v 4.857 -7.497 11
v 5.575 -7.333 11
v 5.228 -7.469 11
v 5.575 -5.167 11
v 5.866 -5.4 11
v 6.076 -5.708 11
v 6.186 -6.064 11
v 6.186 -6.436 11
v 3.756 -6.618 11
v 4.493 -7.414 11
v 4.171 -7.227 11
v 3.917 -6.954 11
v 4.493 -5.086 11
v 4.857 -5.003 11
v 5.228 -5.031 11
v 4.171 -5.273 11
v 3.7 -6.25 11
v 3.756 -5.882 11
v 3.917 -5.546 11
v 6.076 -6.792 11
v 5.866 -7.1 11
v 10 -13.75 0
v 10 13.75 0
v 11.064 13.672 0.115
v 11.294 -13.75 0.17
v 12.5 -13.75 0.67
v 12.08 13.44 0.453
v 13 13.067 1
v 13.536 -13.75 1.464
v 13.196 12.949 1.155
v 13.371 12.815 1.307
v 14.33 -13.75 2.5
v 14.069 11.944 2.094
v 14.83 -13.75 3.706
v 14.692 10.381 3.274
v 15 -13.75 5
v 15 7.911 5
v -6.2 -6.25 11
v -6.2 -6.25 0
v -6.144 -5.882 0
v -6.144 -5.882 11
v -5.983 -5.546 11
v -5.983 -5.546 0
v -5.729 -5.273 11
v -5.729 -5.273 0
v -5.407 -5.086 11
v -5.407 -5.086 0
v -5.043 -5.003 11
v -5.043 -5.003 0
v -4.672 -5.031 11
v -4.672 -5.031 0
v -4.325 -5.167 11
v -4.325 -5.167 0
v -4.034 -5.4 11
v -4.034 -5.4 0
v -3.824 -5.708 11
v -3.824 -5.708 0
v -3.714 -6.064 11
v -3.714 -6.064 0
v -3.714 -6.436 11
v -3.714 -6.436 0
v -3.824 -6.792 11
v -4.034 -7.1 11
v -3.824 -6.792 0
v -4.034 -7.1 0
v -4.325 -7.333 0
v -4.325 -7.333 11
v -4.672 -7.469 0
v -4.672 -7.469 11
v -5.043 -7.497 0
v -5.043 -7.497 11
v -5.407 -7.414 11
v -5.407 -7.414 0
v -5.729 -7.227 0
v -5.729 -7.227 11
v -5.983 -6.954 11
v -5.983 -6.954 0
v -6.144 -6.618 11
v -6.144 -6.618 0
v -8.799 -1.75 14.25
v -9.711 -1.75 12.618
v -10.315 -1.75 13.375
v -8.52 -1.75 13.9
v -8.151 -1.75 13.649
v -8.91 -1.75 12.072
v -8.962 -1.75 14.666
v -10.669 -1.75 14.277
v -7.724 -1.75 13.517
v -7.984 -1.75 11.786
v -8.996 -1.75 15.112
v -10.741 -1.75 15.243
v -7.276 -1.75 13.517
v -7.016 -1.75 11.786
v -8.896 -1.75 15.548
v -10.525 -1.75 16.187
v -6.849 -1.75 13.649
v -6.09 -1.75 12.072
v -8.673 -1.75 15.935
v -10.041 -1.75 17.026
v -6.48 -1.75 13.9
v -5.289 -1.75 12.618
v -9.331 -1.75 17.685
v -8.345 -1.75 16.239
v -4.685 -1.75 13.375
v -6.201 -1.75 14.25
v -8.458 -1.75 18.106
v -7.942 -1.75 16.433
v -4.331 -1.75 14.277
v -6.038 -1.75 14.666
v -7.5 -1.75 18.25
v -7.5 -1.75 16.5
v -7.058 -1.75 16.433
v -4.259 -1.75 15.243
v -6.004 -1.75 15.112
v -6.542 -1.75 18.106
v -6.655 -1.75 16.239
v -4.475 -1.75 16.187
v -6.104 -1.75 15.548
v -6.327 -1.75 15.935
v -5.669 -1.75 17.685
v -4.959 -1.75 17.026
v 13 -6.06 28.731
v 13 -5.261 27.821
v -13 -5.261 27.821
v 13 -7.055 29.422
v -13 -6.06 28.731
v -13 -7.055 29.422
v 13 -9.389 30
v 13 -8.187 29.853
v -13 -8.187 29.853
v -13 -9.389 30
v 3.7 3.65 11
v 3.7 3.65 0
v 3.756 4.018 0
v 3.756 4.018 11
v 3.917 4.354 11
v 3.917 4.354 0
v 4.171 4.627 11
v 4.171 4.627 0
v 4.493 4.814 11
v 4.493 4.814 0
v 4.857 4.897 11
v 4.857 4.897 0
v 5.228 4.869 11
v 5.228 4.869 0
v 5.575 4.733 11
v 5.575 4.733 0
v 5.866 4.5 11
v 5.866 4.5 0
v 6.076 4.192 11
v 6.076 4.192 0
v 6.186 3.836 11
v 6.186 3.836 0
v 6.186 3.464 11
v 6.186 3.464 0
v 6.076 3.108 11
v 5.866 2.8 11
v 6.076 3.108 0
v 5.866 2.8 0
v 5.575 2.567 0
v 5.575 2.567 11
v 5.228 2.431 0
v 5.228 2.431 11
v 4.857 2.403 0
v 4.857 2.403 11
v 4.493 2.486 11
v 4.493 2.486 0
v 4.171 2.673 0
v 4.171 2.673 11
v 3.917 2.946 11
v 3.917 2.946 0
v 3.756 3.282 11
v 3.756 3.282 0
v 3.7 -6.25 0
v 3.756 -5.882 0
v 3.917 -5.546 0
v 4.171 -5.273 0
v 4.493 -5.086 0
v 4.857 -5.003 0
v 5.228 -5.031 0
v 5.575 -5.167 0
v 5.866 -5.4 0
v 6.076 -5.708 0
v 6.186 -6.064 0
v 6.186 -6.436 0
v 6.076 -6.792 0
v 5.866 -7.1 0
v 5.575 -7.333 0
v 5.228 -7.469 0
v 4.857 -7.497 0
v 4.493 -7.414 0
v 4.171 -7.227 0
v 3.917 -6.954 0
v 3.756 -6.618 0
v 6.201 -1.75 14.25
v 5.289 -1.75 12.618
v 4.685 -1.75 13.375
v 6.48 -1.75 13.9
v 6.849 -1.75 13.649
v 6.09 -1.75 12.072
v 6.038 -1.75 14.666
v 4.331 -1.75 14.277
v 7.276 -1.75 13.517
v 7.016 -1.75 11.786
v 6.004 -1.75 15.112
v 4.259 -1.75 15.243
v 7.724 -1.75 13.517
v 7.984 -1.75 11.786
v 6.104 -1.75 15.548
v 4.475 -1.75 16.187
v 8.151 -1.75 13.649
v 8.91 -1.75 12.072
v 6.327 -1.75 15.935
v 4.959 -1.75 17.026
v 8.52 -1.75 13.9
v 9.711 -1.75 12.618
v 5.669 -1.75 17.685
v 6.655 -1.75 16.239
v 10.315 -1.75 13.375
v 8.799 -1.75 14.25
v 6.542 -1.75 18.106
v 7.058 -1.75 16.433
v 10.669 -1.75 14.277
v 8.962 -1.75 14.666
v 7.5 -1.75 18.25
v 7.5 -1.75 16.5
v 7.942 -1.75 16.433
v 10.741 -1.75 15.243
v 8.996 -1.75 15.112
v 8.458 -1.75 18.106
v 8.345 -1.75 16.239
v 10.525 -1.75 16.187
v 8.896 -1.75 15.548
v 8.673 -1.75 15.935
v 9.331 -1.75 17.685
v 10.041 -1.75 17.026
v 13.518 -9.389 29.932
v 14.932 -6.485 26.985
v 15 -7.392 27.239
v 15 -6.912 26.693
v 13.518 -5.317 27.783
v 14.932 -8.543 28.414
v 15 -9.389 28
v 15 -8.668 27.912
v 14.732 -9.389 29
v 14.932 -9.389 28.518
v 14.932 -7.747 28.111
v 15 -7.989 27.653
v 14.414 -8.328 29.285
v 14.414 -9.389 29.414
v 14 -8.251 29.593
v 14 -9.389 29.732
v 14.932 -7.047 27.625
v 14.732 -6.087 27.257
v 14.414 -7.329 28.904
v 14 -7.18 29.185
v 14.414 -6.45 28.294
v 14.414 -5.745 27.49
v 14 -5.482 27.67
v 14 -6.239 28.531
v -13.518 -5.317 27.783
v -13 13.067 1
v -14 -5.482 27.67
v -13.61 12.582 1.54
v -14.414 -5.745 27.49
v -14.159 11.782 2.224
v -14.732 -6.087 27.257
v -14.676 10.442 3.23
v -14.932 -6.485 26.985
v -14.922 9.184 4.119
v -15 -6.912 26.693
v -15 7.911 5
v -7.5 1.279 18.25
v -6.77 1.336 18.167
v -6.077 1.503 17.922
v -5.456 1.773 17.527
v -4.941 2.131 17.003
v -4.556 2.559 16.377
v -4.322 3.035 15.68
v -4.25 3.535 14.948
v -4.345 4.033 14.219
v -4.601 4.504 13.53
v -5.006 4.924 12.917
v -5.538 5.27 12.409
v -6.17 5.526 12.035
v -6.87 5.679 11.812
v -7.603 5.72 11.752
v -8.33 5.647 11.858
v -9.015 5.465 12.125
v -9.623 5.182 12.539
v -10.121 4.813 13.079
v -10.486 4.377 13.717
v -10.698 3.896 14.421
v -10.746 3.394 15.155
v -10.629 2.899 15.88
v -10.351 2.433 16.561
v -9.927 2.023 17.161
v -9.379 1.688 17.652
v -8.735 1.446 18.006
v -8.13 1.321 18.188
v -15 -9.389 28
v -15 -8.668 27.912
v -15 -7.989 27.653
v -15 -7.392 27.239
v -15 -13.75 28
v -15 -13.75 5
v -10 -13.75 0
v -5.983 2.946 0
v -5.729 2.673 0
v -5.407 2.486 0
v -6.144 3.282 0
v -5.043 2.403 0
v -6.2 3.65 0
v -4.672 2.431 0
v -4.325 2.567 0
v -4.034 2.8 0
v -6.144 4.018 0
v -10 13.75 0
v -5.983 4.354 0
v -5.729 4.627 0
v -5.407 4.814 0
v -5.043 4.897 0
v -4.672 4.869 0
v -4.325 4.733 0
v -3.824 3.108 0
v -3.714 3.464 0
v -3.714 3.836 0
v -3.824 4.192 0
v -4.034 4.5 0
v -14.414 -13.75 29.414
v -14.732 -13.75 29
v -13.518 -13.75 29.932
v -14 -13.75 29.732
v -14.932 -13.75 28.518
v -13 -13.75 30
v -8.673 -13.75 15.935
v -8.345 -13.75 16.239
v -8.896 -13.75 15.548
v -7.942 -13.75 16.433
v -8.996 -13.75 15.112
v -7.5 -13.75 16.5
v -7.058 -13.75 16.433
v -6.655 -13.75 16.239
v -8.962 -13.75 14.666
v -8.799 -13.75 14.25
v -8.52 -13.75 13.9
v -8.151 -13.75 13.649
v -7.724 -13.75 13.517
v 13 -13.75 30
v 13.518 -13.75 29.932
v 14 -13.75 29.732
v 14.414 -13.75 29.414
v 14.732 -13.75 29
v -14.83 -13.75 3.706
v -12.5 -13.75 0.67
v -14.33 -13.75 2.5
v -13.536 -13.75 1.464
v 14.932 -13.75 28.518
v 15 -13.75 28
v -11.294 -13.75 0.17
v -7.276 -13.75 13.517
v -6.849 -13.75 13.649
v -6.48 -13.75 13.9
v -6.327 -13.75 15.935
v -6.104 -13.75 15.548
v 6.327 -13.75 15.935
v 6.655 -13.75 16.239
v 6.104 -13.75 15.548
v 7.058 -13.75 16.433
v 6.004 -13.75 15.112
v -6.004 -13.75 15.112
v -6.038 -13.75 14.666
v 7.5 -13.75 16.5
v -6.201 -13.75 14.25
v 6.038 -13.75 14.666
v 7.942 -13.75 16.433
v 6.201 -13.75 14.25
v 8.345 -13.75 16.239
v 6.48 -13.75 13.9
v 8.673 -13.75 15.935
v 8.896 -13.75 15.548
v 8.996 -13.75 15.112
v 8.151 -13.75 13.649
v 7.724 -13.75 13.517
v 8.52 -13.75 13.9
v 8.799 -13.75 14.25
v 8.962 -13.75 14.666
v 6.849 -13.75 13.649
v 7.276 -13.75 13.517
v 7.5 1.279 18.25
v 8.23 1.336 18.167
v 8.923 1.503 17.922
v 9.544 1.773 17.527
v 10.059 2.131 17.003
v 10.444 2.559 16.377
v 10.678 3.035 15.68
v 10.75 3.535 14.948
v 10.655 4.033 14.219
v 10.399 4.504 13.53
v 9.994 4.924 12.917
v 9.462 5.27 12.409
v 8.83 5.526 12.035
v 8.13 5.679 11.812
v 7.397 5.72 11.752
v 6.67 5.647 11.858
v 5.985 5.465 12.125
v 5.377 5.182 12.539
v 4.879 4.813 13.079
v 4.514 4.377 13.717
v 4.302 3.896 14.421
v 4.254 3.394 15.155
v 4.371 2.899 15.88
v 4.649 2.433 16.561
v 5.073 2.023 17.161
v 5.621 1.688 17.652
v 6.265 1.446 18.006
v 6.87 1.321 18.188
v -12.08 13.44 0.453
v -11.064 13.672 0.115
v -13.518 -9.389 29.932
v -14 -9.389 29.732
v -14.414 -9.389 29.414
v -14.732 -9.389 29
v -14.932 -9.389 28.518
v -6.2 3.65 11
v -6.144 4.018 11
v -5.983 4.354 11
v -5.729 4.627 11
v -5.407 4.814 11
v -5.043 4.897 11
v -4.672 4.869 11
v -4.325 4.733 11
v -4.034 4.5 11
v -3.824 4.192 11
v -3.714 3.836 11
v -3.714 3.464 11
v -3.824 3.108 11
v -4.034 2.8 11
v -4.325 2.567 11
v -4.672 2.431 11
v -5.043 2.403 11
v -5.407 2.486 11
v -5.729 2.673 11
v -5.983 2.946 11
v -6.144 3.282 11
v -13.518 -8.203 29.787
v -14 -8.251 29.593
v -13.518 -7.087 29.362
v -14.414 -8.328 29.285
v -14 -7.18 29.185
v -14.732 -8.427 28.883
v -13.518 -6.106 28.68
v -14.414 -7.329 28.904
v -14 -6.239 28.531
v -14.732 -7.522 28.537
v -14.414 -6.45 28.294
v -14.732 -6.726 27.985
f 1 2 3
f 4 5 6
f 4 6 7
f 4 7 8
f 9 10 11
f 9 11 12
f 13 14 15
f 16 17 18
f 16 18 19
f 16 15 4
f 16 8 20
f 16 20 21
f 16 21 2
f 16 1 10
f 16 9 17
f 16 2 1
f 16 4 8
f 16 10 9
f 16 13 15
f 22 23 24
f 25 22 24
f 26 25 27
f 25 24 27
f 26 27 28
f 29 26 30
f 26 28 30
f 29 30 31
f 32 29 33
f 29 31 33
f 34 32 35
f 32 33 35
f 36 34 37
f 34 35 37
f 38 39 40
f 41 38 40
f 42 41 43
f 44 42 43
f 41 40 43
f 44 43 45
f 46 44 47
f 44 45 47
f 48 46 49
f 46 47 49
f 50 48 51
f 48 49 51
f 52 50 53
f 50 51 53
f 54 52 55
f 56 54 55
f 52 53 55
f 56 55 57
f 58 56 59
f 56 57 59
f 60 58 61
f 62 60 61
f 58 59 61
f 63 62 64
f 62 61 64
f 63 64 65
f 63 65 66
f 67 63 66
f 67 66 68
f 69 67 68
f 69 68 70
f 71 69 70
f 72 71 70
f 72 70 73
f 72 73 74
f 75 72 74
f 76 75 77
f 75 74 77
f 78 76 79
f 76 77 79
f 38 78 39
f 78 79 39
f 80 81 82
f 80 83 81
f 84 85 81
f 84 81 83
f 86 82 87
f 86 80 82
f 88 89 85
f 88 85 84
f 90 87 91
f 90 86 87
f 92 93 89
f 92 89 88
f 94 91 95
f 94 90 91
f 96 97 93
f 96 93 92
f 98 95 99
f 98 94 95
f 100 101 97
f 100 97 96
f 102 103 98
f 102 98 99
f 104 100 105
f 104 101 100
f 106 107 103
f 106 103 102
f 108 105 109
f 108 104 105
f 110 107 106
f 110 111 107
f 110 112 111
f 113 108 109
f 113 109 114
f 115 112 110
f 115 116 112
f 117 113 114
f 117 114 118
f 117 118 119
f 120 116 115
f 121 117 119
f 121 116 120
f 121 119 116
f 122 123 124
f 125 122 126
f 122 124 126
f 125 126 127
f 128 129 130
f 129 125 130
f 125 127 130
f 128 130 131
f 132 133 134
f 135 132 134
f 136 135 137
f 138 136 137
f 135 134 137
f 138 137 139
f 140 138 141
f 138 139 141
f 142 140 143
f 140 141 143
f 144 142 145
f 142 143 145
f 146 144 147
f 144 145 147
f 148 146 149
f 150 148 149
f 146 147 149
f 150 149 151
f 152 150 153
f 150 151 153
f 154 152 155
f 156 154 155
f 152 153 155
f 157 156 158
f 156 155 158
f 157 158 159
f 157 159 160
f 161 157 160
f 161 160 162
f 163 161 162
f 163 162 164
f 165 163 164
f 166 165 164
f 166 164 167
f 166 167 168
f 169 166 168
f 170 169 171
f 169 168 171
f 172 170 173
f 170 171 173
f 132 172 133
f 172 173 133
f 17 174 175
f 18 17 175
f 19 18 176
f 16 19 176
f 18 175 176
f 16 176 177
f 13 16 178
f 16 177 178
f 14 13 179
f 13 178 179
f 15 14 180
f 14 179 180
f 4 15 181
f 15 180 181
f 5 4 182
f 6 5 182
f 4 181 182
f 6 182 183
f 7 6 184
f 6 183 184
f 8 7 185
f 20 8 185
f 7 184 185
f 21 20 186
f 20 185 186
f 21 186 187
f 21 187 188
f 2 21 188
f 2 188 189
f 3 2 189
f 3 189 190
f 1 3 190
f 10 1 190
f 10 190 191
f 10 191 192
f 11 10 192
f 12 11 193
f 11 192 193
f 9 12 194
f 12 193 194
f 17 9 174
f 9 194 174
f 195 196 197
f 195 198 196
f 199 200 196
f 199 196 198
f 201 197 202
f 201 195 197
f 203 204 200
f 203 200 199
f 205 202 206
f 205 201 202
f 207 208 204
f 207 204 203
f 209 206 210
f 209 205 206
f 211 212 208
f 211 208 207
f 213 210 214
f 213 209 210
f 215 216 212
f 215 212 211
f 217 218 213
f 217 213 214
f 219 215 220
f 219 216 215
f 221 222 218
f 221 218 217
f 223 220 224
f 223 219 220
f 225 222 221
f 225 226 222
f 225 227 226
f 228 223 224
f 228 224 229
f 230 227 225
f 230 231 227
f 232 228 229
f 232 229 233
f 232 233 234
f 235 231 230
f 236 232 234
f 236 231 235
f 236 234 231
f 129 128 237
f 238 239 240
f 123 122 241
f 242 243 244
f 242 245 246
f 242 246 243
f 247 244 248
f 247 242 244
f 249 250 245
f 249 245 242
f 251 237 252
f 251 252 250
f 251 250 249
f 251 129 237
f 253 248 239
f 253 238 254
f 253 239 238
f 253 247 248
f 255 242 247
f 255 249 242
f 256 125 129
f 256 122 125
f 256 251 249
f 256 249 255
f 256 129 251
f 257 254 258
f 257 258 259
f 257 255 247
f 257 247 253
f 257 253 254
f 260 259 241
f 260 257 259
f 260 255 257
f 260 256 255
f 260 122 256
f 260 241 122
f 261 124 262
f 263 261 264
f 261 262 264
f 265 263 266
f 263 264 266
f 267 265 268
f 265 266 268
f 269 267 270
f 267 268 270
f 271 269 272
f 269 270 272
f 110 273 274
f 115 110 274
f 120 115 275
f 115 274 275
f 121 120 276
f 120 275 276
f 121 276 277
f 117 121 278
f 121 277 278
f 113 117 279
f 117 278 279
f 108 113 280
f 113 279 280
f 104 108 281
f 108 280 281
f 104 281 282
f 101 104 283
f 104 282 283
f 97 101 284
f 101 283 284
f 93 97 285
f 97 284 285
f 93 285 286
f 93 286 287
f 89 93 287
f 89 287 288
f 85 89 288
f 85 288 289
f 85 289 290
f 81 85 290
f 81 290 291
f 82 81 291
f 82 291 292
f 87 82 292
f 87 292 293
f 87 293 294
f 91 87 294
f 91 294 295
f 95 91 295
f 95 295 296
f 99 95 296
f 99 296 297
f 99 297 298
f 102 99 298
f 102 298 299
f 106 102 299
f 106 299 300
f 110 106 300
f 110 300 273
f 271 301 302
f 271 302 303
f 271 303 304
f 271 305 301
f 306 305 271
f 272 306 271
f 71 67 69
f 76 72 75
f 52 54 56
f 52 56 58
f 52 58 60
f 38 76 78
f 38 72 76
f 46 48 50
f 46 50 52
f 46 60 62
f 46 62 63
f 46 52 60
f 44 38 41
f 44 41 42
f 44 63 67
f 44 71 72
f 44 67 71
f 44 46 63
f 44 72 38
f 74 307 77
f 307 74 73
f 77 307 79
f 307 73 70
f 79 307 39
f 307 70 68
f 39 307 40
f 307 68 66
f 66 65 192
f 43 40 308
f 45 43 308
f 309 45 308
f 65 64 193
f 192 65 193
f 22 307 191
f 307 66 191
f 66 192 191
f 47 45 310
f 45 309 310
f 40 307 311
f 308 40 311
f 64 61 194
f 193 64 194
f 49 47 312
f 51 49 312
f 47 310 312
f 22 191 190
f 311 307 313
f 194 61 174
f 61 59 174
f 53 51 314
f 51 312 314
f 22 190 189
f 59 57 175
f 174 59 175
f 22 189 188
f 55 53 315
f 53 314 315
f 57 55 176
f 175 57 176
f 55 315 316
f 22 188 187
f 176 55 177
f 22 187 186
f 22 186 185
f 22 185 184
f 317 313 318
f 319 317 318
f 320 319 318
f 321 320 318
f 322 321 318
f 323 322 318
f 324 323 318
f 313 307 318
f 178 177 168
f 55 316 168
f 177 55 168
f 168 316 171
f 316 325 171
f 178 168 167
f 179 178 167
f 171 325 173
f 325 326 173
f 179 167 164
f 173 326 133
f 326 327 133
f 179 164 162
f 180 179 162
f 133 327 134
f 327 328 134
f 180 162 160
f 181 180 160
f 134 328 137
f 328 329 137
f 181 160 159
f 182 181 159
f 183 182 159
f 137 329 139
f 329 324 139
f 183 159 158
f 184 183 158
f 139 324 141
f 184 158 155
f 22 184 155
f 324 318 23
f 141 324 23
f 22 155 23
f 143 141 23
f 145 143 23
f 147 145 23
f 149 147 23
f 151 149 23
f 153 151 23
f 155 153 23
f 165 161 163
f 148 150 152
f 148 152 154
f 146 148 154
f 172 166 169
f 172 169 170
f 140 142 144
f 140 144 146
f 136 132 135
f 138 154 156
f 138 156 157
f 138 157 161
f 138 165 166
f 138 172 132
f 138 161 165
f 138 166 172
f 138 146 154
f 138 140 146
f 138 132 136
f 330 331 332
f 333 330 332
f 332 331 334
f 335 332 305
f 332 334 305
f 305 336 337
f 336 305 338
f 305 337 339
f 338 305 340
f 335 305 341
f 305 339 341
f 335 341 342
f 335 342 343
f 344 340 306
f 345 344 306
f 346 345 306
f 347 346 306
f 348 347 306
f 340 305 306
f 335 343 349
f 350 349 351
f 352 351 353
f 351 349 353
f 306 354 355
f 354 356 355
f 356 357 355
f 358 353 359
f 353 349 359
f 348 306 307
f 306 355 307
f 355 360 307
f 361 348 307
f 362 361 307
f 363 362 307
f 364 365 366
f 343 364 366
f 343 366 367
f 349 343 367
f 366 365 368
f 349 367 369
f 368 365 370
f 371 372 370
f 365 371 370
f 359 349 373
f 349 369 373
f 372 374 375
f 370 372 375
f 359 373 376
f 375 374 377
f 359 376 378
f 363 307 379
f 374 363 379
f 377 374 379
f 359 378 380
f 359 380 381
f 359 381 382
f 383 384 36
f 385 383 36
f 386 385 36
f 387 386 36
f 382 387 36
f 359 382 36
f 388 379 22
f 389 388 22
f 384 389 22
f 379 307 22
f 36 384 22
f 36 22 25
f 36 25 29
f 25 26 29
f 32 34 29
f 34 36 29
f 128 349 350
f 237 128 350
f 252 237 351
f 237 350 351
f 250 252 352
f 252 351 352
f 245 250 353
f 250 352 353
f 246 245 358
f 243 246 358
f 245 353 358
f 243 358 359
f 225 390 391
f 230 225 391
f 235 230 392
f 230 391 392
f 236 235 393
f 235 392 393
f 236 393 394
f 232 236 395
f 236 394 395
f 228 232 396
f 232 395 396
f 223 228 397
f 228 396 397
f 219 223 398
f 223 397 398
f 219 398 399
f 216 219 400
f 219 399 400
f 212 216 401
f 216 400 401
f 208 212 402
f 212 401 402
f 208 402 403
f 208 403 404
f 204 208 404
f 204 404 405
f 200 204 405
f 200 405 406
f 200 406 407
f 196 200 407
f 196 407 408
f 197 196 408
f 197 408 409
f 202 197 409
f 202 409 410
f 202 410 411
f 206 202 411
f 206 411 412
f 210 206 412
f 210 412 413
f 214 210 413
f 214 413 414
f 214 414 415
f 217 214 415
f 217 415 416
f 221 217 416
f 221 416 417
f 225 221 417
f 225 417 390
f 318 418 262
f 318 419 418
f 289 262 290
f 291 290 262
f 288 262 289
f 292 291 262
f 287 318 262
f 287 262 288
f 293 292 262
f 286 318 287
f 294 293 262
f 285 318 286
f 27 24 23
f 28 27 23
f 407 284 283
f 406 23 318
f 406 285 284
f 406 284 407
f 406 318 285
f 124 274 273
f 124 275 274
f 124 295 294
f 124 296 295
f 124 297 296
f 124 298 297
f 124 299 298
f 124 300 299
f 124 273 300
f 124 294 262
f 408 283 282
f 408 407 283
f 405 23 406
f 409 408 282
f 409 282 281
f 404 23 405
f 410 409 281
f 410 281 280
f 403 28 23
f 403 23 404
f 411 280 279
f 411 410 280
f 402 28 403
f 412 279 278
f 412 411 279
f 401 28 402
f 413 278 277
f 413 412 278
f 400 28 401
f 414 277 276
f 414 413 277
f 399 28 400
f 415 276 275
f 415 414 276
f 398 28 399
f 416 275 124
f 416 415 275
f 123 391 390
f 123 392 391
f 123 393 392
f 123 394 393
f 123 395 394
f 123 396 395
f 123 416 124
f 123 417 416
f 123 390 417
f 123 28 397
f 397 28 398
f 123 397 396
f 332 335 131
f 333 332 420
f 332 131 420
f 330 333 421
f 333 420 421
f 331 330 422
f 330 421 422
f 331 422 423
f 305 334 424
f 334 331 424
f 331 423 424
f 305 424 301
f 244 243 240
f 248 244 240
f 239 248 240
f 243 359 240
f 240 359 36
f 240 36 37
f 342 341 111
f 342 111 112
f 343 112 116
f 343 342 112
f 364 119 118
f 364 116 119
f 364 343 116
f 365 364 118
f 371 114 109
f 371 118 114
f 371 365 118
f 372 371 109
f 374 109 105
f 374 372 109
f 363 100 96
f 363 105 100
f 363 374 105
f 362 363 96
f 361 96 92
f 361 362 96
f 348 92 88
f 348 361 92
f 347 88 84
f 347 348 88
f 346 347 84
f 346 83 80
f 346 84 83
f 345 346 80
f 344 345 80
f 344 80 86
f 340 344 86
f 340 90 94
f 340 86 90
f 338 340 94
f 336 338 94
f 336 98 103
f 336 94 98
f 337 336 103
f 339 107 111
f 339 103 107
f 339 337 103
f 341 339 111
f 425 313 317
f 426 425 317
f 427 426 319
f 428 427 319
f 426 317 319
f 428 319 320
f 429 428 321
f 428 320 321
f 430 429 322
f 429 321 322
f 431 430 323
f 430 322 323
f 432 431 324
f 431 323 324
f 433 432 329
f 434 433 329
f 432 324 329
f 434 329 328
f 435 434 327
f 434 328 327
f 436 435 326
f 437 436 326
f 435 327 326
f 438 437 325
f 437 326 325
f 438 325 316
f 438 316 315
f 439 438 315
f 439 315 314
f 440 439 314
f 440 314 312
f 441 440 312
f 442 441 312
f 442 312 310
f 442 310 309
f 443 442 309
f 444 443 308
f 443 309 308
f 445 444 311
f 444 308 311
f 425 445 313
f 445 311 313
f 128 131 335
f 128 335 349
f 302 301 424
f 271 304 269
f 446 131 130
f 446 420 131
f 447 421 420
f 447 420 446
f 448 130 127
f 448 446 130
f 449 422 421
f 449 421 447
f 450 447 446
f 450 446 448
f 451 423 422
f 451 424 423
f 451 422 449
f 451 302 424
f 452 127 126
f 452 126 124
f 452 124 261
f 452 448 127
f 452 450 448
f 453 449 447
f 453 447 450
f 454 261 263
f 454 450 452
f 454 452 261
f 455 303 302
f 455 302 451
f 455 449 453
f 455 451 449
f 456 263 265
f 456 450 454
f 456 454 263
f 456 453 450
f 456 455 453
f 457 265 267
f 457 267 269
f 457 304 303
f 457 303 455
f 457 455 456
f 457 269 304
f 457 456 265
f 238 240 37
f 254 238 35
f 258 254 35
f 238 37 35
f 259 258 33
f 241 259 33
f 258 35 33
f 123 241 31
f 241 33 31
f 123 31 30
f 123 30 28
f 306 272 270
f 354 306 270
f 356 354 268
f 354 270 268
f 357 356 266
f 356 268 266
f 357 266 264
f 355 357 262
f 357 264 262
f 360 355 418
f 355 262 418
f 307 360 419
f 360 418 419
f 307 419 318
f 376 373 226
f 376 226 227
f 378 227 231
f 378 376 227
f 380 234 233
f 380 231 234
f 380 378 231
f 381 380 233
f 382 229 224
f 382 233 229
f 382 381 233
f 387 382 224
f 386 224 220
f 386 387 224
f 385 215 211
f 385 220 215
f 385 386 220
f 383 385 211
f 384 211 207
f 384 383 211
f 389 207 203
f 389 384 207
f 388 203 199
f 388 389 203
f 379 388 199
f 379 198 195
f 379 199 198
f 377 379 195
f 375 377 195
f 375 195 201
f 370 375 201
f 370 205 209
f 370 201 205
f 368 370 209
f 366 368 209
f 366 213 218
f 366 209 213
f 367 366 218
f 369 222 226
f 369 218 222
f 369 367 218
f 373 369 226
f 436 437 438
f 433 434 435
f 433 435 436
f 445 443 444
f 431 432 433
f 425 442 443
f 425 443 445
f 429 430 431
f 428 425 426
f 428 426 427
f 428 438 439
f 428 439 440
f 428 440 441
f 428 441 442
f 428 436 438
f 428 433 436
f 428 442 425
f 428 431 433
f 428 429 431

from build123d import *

# Parameters (mm, degrees)
SKETCH1_W              = 30
SKETCH1_H              = 27.5
EXTRUDE1_DEPTH         = 30
EXTRUDE3_DEPTH         = 45.598906937
SKETCH7_R              = 1.25
CUT_EXTRUDE_1045_DEPTH = 11
SKETCH8_R              = 3.25
EXTRUDE8_DEPTH         = 15.5
EXTRUDE9_DEPTH         = 44.373378932
EXTRUDE9_DEPTH_BACK    = 44.373378932
SKETCH9_R              = 1.5
FILLET1_R              = 5
FILLET3_R              = 2


with BuildPart() as part:
    # Sketch1 → Extrude1 (new body)
    with BuildSketch(Plane.XY):
        Rectangle(SKETCH1_W, SKETCH1_H)
    extrude(amount=EXTRUDE1_DEPTH)

    # Sketch3 → Extrude3 (cut, through all)
    with BuildSketch(Plane(origin=(15, 0, 0), x_dir=(0, 0, -1), z_dir=(1, 0, 0))):
        Polygon((-30, -6.75), (-30, 13.75), (0, 13.75), align=None)
    extrude(amount=-EXTRUDE3_DEPTH, mode=Mode.SUBTRACT)

    # Sketch7 → Cut-Extrude 1045 (cut)
    with BuildSketch(Plane(origin=(0, 0, 0), x_dir=(-1, 0, 0), z_dir=(0, 0, -1))):
        with Locations((-4.95, 3.65)):
            Circle(SKETCH7_R)
        with Locations((4.95, 3.65)):
            Circle(SKETCH7_R)
        with Locations((4.95, -6.25)):
            Circle(SKETCH7_R)
        with Locations((-4.95, -6.25)):
            Circle(SKETCH7_R)
    extrude(amount=-CUT_EXTRUDE_1045_DEPTH, mode=Mode.SUBTRACT)

    # Sketch8 → Extrude8 (cut)
    with BuildSketch(Plane(origin=(0, 13.75, 0), x_dir=(1, 0, 0), z_dir=(0, 1, 0))):
        with Locations(Location((-7.5, -15, 0), (0, 0, 270))):
            Circle(SKETCH8_R)
        with Locations(Location((7.5, -15, 0), (0, 0, 270))):
            Circle(SKETCH8_R)
    extrude(amount=-EXTRUDE8_DEPTH, mode=Mode.SUBTRACT)

    # Sketch9 → Extrude9 (cut, two sides: drawn at the far end of the back side and taken through both)
    with BuildSketch(Plane(origin=(0, 13.75, 0), x_dir=(1, 0, 0), z_dir=(0, 1, 0)).offset(-EXTRUDE9_DEPTH_BACK)):
        with Locations(Location((-7.5, -15, 0), (0, 0, 270))):
            Circle(SKETCH9_R)
        with Locations(Location((7.5, -15, 0), (0, 0, 270))):
            Circle(SKETCH9_R)
    extrude(amount=EXTRUDE9_DEPTH + EXTRUDE9_DEPTH_BACK, mode=Mode.SUBTRACT)

    # Fillet1
    fillet1_edges = [part.edges().sort_by_distance(p)[0] for p in [
        (0, -6.75, 30),
        (15, 0, 0),
        (-15, 0, 0),
    ]]
    fillet(fillet1_edges, radius=FILLET1_R)

    # Fillet3
    # the kernel refuses this fillet: 2 mm, written as the material it takes off along each edge
    with BuildSketch(Plane(origin=(15, -18.75, 30), x_dir=(-1, 0, 0), z_dir=(0, 1, 0))) as fillet3_piece_1:
        with BuildLine():
            CenterArc((FILLET3_R, -FILLET3_R), FILLET3_R, 90, 90)
            Line((0, -FILLET3_R), (0, 0))
            Line((0, 0), (FILLET3_R, 0))
        make_face()
    extrude(amount=9.360792567, mode=Mode.SUBTRACT)
    with BuildSketch(Plane(origin=(-15, -9.389207433, 30), x_dir=(0, 0, -1), z_dir=(0, -1, 0))) as fillet3_piece_2:
        with BuildLine():
            CenterArc((FILLET3_R, FILLET3_R), FILLET3_R, 180, 90)
            Line((0, FILLET3_R), (0, 0))
            Line((0, 0), (FILLET3_R, 0))
        make_face()
    extrude(amount=9.360792567, mode=Mode.SUBTRACT)
    with BuildSketch(Plane(origin=(-15, 13.154285858, 0.871776792), x_dir=(0, -0.8256446415008141, -0.5641905050255563), z_dir=(0, -0.5641905050255562, 0.8256446415008141))) as fillet3_piece_3:
        with BuildLine():
            CenterArc((FILLET3_R, FILLET3_R), FILLET3_R, 180, 90)
            Line((0, FILLET3_R), (0, 0))
            Line((0, 0), (FILLET3_R, 0))
        make_face()
    extrude(amount=32.640163065, mode=Mode.SUBTRACT)
    with BuildSketch(Plane(origin=(15, 13.154285858, 0.871776792), x_dir=(0, -0.8256446415008141, -0.5641905050255563), z_dir=(0, -0.5641905050255562, 0.8256446415008141))) as fillet3_piece_4:
        with BuildLine():
            CenterArc((FILLET3_R, -FILLET3_R), FILLET3_R, 90, 90)
            Line((0, -FILLET3_R), (0, 0))
            Line((0, 0), (FILLET3_R, 0))
        make_face()
    extrude(amount=32.640163065, mode=Mode.SUBTRACT)
    with BuildSketch(Plane(origin=(15, -9.389207433, 25), x_dir=(0, 0, 1), z_dir=(0, -1, 0))) as fillet3_piece_5:
        with BuildLine():
            CenterArc((5 - FILLET3_R, FILLET3_R), FILLET3_R, 270, 90)
            Line((5, FILLET3_R), (5, 0))
            Line((5, 0), (5 - FILLET3_R, 0))
        make_face()
    revolve(axis=Axis((15, -9.389207433, 25), (-1, 0, 0)), revolution_arc=55.6539026, mode=Mode.SUBTRACT)
    with BuildSketch(Plane(origin=(-15, -9.389207433, 25), x_dir=(0, 0, 1), z_dir=(0, -1, 0))) as fillet3_piece_6:
        with BuildLine():
            CenterArc((5 - FILLET3_R, -FILLET3_R), FILLET3_R, 0, 90)
            Line((5, -FILLET3_R), (5, 0))
            Line((5, 0), (5 - FILLET3_R, 0))
        make_face()
    revolve(axis=Axis((-15, -9.389207433, 25), (-1, 0, 0)), revolution_arc=55.6539026, mode=Mode.SUBTRACT)


solid = part.part
